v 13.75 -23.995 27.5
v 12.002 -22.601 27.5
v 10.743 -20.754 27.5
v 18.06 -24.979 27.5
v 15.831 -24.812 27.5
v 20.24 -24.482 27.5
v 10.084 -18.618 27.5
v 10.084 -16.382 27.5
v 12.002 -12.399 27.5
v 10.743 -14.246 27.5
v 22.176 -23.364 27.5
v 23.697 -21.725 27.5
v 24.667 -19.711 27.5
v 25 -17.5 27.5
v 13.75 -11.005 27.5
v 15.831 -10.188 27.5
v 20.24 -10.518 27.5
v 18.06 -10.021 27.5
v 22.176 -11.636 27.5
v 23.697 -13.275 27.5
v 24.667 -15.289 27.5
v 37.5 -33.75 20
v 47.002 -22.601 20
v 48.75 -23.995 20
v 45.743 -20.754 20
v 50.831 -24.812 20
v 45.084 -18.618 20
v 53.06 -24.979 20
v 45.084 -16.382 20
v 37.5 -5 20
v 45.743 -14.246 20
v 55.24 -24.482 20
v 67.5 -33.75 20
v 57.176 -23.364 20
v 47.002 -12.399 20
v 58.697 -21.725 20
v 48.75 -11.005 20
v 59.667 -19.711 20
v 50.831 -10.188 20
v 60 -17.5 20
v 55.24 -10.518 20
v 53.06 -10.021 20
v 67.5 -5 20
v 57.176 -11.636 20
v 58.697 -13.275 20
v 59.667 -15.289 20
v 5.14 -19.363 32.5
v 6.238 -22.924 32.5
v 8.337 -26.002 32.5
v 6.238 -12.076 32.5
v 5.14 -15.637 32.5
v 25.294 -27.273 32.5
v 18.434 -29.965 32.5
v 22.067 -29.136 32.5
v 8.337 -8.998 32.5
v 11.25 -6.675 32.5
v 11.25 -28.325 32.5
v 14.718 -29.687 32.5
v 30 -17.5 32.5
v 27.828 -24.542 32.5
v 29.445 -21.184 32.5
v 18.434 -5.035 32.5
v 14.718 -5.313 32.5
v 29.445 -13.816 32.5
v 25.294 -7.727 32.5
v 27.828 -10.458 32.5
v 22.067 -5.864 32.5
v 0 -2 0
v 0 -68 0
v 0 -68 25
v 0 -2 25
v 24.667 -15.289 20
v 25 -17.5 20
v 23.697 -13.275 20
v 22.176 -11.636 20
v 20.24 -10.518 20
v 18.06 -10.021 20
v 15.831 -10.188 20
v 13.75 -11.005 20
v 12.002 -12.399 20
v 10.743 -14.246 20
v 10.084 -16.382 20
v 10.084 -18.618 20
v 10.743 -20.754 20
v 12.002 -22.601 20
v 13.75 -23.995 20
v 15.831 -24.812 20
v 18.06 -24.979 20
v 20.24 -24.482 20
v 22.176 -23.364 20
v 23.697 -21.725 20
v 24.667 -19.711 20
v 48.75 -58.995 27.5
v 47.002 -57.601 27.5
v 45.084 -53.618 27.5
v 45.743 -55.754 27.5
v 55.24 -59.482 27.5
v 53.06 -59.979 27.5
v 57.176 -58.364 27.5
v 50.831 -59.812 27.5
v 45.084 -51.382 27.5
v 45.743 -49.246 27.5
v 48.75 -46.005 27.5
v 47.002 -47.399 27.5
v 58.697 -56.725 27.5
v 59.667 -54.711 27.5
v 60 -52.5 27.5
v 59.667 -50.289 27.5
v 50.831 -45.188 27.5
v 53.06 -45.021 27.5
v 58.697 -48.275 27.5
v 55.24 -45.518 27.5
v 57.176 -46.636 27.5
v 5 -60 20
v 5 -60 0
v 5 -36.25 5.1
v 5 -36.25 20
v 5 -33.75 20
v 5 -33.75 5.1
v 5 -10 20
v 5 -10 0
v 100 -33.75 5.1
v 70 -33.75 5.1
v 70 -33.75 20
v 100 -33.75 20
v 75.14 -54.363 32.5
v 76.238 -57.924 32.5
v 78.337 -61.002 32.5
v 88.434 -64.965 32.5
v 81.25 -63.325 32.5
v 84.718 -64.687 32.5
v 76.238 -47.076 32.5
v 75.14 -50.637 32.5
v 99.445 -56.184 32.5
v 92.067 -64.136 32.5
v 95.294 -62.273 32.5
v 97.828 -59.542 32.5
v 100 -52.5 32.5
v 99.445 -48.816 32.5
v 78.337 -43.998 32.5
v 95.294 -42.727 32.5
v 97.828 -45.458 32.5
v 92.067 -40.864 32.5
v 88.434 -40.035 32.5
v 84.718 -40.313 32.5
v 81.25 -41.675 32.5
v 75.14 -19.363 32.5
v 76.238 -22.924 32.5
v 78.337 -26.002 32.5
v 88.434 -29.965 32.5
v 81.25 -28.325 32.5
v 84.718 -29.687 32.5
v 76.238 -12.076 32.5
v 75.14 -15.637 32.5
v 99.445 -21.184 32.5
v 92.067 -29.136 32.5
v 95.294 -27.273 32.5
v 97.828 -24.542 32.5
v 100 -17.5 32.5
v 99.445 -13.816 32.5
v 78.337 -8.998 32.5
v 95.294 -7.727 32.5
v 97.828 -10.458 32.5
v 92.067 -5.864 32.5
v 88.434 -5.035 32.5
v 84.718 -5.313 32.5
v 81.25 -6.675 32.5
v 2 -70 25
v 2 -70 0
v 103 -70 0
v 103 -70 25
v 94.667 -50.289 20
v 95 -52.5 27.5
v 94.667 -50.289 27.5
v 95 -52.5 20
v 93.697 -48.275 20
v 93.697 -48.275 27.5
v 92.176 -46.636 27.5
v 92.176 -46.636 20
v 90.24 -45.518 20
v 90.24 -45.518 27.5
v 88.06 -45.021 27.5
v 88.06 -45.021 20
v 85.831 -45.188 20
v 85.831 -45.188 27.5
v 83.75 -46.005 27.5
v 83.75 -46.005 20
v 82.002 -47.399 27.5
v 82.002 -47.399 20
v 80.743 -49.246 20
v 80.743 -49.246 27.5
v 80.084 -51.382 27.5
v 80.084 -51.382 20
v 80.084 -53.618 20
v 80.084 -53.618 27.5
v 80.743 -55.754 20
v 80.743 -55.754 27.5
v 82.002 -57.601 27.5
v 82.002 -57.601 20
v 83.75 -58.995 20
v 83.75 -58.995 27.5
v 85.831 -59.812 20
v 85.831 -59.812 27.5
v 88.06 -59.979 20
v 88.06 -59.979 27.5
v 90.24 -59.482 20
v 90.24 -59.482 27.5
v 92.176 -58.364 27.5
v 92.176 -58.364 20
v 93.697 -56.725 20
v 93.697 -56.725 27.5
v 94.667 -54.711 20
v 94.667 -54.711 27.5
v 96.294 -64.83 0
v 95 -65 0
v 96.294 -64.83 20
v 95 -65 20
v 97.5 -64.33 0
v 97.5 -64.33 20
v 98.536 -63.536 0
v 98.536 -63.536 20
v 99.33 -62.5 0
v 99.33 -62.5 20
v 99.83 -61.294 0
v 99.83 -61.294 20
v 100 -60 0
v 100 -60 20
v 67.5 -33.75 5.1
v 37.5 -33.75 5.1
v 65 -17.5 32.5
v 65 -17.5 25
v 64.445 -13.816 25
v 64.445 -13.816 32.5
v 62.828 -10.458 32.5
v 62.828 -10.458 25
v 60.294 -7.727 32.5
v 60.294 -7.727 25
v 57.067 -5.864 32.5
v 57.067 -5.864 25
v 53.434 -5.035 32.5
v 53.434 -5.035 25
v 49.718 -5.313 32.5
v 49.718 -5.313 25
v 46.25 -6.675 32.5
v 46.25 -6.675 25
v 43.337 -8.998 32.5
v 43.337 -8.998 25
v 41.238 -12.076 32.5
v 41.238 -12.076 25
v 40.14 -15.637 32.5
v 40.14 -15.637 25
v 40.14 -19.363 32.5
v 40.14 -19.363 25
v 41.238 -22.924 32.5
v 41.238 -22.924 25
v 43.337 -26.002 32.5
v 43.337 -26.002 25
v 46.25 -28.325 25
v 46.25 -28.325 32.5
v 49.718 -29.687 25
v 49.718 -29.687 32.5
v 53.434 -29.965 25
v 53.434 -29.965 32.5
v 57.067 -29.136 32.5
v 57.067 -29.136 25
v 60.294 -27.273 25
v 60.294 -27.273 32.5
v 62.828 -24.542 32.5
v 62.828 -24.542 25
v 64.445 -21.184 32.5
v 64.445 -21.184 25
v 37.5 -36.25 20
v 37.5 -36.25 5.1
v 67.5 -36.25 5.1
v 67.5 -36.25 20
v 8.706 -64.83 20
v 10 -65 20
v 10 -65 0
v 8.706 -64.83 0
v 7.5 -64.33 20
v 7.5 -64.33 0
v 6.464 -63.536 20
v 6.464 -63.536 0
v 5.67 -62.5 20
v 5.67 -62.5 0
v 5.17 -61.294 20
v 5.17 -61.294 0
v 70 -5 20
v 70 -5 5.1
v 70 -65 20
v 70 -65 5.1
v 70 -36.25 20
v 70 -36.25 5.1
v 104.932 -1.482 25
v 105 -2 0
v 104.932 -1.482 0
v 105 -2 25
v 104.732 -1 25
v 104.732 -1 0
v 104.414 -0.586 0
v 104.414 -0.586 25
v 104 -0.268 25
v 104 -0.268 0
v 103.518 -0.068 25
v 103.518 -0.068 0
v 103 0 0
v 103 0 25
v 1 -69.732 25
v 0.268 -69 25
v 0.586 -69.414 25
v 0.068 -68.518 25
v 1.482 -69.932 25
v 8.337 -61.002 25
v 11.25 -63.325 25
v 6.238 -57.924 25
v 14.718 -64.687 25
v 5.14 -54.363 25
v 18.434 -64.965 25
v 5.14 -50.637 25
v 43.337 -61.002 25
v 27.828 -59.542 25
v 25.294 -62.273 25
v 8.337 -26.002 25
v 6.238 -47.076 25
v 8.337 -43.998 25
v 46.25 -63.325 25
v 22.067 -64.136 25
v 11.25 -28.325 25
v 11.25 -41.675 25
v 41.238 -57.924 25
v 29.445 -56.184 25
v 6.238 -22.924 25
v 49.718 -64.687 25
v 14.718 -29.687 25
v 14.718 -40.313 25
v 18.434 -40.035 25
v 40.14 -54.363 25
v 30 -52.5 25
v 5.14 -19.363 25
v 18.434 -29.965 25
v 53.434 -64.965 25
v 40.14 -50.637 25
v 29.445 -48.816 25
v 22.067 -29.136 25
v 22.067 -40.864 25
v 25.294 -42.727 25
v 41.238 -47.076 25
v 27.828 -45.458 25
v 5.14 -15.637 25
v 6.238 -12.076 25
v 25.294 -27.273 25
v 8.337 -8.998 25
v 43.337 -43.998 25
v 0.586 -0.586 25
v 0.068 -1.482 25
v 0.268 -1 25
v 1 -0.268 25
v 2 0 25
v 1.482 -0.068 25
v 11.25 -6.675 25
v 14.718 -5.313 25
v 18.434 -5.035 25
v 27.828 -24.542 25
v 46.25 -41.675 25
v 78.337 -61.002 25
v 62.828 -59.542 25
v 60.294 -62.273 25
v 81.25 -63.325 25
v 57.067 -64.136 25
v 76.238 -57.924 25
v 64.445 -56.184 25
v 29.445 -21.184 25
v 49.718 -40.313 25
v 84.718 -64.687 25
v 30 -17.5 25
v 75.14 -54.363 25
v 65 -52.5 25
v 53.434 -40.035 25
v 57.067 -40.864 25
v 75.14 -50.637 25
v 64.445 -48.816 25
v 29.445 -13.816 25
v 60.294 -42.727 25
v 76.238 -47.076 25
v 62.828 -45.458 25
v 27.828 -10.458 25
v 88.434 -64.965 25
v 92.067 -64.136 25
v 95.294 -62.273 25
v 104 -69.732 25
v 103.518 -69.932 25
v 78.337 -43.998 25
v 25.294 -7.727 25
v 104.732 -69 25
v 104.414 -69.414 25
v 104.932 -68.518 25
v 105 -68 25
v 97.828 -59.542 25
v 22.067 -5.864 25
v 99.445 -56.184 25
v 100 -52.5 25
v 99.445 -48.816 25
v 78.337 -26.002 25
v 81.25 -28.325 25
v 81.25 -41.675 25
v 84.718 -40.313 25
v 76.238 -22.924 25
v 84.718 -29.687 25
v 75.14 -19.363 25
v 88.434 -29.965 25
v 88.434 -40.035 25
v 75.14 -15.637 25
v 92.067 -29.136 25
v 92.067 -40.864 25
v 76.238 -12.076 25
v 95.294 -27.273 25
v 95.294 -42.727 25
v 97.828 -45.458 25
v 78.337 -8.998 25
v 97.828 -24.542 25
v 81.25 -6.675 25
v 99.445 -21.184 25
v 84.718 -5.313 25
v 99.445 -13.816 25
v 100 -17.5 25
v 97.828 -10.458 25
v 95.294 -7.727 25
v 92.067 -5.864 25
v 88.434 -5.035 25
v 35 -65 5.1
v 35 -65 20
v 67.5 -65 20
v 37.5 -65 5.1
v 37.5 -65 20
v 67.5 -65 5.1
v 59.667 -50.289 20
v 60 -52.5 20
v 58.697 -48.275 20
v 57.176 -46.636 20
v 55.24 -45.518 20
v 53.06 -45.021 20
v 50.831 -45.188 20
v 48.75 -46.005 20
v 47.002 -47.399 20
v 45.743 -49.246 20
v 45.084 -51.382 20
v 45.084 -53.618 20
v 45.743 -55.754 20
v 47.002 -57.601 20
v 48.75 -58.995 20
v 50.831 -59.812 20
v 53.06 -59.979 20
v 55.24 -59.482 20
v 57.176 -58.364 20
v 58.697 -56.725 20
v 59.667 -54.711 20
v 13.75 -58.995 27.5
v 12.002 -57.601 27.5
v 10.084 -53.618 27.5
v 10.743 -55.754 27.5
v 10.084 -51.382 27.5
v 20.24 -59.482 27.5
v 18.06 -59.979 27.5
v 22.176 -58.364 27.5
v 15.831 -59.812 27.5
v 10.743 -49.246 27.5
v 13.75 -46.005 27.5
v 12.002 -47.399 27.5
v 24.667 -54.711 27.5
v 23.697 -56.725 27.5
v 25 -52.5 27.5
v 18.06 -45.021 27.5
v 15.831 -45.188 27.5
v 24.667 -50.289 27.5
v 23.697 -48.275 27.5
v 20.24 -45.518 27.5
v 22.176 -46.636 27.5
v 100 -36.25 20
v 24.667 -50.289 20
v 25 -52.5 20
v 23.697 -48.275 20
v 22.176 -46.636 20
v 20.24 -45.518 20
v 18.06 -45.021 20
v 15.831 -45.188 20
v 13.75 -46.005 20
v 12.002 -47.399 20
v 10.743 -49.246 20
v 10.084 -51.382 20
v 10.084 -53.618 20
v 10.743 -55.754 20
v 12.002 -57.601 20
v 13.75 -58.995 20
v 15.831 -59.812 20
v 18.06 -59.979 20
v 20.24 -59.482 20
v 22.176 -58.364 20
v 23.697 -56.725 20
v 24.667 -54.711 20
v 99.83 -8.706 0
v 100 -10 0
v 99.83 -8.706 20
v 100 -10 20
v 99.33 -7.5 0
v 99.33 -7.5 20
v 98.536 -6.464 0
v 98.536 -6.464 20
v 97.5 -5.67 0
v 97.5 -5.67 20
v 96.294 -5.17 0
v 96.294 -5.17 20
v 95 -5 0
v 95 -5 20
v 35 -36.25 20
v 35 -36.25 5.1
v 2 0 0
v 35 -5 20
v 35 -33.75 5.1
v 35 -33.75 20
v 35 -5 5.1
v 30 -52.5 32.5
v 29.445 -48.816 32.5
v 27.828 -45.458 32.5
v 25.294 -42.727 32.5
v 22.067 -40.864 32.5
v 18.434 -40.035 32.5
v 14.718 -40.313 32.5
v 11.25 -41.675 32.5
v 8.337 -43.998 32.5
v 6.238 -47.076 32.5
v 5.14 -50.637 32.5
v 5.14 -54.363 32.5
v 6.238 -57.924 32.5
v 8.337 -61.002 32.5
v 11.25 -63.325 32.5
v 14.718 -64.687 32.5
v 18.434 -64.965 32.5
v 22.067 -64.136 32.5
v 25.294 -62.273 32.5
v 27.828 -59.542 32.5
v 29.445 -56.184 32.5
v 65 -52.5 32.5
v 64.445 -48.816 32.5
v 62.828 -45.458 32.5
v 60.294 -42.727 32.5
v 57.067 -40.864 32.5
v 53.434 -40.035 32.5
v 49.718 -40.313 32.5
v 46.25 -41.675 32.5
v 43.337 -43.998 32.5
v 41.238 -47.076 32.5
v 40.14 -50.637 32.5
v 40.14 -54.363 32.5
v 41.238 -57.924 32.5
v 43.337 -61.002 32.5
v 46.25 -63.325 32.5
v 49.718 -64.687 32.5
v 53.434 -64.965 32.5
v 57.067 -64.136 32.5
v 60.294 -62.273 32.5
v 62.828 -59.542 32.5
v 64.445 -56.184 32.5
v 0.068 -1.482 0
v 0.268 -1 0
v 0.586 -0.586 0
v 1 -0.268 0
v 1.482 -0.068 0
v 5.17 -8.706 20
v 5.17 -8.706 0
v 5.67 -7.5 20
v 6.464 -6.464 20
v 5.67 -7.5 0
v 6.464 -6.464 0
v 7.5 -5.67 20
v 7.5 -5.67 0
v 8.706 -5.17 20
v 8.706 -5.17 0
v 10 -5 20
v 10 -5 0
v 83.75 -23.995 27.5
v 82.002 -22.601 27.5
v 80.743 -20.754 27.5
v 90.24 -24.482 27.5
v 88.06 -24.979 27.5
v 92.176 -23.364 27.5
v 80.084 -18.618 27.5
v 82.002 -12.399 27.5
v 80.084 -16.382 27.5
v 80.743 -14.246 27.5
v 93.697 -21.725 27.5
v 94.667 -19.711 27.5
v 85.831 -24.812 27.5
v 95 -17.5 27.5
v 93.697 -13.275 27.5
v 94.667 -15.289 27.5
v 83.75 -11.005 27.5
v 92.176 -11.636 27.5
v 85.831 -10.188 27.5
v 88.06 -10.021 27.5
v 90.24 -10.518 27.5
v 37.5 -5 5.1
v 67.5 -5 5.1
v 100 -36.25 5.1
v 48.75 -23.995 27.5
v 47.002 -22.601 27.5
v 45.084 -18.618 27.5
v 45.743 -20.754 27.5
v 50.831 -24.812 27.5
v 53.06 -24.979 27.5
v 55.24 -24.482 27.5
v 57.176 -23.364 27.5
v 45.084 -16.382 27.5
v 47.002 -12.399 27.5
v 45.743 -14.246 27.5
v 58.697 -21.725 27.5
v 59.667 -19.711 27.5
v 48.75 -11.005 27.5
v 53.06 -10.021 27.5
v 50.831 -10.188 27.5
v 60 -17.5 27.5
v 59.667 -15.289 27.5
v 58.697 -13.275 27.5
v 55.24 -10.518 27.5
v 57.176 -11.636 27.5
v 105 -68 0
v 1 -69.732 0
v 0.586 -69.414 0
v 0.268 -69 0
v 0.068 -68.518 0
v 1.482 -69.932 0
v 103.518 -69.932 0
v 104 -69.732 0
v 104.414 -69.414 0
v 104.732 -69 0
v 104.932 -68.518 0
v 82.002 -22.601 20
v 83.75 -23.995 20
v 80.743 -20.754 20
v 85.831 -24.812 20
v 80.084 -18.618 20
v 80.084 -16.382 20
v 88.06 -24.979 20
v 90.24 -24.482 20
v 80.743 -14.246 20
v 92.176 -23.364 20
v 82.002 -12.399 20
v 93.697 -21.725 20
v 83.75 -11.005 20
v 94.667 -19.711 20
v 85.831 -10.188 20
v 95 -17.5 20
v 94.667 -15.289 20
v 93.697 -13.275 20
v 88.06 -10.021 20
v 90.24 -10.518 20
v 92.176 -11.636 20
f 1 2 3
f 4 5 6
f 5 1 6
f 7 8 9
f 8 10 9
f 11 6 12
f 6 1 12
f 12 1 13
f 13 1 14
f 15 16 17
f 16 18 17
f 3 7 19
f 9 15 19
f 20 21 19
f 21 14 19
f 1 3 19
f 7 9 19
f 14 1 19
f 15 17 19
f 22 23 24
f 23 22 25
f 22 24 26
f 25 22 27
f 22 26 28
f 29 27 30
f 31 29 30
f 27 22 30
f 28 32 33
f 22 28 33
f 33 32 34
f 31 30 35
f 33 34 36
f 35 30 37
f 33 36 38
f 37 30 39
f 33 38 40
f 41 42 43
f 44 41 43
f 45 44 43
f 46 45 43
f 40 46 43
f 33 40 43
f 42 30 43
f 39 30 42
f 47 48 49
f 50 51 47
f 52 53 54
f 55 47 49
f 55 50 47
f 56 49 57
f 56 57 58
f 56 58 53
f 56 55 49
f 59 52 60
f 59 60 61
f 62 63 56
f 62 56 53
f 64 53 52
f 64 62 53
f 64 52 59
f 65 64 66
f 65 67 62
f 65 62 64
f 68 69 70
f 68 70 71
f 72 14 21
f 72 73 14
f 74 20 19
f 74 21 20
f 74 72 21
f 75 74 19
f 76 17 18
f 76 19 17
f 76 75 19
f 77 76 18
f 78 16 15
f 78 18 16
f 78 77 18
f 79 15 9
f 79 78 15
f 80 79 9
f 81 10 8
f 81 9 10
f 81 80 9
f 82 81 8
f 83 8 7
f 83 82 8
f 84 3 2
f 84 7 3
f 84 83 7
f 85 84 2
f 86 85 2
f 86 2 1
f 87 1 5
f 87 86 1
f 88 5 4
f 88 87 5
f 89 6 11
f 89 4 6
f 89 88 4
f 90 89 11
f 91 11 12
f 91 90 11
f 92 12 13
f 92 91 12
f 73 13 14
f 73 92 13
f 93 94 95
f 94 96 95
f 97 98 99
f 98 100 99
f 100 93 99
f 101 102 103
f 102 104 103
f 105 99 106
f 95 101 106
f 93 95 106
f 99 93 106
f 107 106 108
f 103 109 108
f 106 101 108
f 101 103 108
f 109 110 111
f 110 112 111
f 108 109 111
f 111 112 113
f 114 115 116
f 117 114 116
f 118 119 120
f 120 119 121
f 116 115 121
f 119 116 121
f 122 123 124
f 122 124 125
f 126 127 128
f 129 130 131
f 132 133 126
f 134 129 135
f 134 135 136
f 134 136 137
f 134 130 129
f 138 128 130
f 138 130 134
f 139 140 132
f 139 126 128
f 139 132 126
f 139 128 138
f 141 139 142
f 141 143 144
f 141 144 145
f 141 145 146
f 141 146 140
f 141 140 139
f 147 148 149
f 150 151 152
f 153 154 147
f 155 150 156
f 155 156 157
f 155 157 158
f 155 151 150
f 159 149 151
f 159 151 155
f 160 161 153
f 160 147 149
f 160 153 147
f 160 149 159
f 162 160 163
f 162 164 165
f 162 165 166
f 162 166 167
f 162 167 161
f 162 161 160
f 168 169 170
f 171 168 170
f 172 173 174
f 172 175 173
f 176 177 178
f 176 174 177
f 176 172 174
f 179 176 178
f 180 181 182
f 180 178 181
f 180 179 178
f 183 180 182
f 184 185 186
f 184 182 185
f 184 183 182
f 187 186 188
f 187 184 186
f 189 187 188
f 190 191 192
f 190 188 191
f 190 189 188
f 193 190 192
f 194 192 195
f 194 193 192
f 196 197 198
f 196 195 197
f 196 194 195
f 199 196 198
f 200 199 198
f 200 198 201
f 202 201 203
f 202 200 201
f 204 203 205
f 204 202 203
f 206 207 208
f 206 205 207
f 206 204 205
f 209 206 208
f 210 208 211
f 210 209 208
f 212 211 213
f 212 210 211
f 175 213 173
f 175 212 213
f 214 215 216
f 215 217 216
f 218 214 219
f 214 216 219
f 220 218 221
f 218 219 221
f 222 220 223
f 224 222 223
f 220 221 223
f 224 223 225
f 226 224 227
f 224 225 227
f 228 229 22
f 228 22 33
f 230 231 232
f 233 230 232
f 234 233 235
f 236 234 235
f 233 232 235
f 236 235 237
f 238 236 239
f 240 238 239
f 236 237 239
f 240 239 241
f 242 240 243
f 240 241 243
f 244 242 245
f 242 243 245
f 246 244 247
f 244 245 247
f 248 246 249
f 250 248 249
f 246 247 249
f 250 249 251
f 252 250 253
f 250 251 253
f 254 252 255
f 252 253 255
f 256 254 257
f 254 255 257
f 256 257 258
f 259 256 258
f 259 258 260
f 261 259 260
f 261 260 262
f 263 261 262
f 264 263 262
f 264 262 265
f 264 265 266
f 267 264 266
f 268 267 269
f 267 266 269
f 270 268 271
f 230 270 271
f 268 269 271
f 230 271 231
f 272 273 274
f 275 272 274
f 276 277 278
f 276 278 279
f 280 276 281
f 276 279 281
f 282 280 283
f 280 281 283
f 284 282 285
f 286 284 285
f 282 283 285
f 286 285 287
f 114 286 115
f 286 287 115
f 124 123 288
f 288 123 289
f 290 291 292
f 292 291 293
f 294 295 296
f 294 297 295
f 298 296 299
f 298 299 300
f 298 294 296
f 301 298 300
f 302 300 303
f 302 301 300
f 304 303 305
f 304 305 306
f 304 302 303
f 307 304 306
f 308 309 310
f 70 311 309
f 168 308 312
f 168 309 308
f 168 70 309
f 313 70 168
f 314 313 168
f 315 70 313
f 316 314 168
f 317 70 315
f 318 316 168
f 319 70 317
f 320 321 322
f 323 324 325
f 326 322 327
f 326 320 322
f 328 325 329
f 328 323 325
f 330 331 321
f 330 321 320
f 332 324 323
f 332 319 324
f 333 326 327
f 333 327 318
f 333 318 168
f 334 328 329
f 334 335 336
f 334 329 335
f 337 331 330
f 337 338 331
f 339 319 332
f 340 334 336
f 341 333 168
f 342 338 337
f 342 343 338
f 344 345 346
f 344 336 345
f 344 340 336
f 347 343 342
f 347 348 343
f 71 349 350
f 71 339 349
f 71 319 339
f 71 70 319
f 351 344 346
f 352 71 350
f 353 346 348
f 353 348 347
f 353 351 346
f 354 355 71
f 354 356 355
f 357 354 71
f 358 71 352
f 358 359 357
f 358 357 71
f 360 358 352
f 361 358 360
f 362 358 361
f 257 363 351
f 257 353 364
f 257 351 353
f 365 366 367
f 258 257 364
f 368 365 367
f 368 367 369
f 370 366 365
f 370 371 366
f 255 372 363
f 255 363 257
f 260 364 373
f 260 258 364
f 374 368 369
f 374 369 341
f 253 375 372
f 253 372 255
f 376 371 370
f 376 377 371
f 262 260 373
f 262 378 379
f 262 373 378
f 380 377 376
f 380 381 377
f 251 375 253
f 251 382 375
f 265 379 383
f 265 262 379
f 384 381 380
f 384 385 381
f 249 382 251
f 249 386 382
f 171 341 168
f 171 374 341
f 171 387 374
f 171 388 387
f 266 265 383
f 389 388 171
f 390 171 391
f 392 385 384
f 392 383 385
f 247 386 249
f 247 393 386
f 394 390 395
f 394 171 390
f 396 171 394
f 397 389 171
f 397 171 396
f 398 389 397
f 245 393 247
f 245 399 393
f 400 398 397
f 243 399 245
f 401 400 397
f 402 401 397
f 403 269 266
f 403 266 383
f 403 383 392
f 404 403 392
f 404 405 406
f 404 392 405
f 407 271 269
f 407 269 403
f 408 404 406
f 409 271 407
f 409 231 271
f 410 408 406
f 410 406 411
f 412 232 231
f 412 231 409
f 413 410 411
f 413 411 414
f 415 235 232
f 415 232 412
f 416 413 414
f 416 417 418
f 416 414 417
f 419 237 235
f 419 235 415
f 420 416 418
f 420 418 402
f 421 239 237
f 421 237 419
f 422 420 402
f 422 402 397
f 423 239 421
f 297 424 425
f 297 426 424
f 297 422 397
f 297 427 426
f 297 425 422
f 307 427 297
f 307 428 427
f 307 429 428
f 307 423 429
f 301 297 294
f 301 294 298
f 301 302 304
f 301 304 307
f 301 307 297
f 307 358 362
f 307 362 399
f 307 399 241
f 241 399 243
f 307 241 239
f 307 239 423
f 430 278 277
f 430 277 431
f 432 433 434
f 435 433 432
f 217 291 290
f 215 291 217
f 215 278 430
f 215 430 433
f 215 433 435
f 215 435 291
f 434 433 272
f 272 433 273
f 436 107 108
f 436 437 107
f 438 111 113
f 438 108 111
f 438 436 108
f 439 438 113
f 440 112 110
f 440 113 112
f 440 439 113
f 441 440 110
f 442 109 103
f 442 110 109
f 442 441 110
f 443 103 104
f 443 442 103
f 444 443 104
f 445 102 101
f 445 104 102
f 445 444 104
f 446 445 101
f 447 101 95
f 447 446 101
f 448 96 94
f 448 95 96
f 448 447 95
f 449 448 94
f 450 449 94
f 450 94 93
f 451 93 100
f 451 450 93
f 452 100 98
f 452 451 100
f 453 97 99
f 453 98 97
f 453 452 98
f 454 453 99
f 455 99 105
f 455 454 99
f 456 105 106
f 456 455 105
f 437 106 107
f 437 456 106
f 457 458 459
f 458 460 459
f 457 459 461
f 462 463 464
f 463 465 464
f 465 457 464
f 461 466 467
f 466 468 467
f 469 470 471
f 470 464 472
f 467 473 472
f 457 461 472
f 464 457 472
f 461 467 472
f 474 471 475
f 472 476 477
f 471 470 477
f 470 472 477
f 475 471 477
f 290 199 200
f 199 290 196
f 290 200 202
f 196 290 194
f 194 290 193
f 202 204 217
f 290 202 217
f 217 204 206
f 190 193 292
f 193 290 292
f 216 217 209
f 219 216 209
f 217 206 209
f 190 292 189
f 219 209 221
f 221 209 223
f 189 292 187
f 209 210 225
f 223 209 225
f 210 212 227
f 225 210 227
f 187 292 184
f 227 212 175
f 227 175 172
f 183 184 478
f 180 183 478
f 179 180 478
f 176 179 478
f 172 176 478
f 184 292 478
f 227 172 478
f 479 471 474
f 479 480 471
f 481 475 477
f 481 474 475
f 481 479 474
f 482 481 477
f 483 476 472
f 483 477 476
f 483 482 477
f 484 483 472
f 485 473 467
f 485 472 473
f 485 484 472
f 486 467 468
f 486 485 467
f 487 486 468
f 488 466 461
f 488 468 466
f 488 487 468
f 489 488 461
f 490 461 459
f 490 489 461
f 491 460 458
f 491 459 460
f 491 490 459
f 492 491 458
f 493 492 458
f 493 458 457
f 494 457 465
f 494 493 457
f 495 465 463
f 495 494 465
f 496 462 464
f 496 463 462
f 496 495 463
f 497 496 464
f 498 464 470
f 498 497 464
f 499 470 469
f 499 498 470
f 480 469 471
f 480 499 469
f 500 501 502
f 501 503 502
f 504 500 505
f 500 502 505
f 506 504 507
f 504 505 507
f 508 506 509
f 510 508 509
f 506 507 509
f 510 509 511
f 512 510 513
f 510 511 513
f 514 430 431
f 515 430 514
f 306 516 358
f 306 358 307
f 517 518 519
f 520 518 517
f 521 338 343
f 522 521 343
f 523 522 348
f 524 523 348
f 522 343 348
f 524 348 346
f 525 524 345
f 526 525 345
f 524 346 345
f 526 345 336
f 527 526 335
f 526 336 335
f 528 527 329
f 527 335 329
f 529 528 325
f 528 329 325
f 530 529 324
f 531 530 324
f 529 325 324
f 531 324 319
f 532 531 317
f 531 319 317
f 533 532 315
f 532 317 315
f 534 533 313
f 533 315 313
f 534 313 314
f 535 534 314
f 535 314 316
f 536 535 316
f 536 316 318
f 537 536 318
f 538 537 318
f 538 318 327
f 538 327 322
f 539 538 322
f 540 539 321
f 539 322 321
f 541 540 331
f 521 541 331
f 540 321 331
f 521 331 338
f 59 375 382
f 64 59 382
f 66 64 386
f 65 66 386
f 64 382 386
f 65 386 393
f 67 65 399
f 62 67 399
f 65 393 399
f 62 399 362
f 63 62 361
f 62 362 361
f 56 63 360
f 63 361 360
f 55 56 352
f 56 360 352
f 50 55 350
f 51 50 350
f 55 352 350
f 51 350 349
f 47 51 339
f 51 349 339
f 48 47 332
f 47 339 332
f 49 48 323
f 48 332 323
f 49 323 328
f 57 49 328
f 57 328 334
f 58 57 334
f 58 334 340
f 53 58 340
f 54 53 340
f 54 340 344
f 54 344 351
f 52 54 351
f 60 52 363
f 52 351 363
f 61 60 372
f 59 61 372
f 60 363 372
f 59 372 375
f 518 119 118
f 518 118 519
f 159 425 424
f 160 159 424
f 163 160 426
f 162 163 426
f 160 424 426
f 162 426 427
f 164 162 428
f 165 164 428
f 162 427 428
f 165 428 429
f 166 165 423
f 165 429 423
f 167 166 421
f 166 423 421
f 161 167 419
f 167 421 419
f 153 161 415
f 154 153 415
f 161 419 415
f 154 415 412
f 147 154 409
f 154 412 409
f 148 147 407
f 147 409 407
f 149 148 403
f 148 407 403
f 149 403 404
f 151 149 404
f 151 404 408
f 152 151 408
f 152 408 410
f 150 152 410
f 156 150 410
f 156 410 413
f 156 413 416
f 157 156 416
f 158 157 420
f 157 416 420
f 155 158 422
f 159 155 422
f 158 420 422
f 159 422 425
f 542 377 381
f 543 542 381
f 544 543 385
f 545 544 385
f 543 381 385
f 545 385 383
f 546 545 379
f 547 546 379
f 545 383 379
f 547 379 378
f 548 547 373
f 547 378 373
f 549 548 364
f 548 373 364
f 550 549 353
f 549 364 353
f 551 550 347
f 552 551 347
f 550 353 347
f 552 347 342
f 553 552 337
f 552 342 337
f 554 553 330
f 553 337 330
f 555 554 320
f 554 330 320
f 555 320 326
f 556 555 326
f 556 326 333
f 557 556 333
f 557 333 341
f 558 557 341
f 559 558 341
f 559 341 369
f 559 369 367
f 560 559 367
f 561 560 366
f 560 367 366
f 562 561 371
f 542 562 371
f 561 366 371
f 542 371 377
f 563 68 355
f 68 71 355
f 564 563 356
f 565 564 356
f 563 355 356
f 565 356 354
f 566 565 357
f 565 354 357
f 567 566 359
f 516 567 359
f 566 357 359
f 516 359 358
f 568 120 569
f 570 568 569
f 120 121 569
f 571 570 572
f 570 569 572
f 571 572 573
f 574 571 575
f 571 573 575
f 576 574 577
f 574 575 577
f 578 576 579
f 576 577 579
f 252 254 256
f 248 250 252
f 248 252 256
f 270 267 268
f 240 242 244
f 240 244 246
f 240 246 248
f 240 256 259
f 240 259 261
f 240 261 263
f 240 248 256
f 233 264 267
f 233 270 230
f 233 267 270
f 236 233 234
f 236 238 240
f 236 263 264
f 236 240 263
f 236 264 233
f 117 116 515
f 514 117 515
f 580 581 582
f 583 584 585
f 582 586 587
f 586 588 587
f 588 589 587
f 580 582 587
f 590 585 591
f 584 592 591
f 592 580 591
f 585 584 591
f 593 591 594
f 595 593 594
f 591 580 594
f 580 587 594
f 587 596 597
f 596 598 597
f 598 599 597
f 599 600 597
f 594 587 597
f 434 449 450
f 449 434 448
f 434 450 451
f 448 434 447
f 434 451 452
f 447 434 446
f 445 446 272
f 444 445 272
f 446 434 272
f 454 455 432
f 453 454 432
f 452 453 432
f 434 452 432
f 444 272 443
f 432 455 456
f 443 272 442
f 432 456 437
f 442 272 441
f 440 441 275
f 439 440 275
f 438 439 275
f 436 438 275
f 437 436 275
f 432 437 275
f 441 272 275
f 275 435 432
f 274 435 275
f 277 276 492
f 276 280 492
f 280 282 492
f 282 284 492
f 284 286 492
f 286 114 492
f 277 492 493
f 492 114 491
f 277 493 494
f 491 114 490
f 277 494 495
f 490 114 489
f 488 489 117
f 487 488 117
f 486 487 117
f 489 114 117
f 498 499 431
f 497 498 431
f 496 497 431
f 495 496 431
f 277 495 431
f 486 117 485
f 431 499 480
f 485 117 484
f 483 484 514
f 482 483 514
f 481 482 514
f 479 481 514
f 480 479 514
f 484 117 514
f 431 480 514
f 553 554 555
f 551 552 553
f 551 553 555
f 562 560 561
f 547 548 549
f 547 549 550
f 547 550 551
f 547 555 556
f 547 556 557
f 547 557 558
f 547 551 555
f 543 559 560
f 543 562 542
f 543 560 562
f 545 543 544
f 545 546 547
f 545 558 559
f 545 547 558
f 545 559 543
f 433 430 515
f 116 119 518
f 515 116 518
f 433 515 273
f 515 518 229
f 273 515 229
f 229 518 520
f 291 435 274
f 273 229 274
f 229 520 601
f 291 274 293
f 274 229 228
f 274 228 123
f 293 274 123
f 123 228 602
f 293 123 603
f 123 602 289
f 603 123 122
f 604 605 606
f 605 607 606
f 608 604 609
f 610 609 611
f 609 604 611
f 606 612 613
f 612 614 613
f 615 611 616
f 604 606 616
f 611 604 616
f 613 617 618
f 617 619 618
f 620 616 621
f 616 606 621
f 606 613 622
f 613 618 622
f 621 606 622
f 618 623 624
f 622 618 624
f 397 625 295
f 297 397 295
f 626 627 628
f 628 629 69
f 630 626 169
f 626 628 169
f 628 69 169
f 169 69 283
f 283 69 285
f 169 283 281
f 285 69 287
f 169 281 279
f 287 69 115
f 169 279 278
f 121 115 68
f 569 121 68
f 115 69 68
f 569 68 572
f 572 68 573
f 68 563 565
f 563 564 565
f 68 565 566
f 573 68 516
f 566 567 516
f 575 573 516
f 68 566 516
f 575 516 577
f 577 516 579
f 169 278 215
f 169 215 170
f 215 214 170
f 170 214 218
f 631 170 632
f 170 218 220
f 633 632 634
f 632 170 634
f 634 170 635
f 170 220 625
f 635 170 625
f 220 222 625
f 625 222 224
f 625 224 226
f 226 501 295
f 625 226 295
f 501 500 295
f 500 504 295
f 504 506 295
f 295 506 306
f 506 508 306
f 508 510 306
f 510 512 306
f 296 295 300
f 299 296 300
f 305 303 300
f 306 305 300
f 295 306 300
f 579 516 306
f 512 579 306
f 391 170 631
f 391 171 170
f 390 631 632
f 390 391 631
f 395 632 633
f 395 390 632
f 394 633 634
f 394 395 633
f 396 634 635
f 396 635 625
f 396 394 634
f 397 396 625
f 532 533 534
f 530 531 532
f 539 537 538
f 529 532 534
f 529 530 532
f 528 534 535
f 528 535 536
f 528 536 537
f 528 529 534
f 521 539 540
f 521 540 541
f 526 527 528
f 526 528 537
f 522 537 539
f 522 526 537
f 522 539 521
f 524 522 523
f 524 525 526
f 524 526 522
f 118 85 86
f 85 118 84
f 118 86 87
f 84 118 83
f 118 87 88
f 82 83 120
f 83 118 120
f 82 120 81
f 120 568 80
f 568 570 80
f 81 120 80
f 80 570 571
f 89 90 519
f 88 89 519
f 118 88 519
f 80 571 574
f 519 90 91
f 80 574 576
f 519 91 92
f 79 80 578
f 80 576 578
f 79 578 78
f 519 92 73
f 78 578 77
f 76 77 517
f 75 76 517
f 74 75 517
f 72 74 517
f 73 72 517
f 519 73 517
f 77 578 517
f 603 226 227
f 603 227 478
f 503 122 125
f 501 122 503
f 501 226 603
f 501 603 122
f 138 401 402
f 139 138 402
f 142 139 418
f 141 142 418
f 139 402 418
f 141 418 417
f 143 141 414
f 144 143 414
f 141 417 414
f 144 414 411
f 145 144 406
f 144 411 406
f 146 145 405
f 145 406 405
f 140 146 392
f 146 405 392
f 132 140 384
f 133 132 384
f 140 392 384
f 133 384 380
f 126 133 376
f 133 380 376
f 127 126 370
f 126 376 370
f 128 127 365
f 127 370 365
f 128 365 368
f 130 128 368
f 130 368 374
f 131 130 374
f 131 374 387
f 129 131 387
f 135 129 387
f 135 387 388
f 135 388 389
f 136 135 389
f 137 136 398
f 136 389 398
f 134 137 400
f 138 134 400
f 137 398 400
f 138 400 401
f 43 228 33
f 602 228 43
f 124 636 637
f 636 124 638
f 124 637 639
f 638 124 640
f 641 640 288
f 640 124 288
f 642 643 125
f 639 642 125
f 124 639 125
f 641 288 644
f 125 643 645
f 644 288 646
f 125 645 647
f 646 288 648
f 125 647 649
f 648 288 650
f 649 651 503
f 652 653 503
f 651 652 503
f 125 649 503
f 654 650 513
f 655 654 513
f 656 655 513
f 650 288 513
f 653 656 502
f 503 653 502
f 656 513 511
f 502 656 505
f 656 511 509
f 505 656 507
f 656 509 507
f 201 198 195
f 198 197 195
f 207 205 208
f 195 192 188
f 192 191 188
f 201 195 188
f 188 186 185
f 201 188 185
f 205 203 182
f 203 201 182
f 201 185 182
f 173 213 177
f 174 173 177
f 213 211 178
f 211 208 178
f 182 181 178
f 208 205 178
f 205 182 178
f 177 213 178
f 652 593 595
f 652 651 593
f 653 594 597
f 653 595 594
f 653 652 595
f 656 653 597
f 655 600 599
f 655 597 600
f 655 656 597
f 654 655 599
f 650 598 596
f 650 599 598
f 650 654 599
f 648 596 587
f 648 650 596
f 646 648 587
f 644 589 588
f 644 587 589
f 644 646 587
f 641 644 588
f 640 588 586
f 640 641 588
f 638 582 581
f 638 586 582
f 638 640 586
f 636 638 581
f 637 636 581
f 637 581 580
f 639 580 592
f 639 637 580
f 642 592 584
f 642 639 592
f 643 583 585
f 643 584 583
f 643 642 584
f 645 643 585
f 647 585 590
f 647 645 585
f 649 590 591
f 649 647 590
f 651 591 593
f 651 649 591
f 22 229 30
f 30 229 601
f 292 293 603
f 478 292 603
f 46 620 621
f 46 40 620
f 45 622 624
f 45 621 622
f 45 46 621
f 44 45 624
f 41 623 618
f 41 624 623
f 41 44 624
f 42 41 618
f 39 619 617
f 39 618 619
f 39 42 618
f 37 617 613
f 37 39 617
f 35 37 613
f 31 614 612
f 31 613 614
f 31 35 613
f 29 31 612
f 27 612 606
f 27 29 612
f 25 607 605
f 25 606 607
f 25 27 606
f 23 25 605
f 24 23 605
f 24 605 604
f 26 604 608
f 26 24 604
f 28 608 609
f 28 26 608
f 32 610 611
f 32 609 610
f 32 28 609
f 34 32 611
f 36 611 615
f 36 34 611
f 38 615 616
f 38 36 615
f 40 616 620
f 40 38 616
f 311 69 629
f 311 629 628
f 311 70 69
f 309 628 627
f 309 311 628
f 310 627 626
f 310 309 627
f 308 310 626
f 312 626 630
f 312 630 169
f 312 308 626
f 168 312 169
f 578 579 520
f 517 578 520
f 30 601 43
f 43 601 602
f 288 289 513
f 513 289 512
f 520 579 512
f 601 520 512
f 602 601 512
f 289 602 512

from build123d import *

# Parameters (mm, degrees)
F0_W     = 105
F0_H     = 70
F1_DEPTH = 25
F2_R     = 12.5
F3_DEPTH = 7.5
F4_T     = -5
F6_W     = 95
F6_H     = 2.5
F7_DEPTH = 14.9
F8_W     = 2.5
F8_H     = 60
F9_DEPTH = 19.9
F10_R    = 5
F11_R    = 2


# Not quite as in the source:
# - an extrude ends at something that could not be found from the text; its depth is read off the source's solid


with BuildPart() as f1:
    # F0 (on Top) → F1 (new body)
    with BuildSketch(Plane.XY):
        with Locations((52.5, -35)):
            Rectangle(F0_W, F0_H)
    extrude(amount=F1_DEPTH)

    # F2 (on face) → F3 (join)
    with BuildSketch(Plane.XY.offset(25)):
        with Locations((17.5, -17.5)):
            Circle(F2_R)
        with Locations((52.5, -17.5)):
            Circle(F2_R)
        with Locations((87.5, -17.5)):
            Circle(F2_R)
        with Locations((17.5, -52.5)):
            Circle(F2_R)
        with Locations((52.5, -52.5)):
            Circle(F2_R)
        with Locations((87.5, -52.5)):
            Circle(F2_R)
    extrude(amount=F3_DEPTH)

    # F4
    f4_openings = [f1.faces().sort_by_distance(p)[0] for p in [
        (52.5, -35, 0),
    ]]
    offset(amount=F4_T, openings=f4_openings, kind=Kind.INTERSECTION)

    # F6 (on offset) → F7 (join, through all)
    with BuildSketch(Plane.XY.offset(5.1)):
        with Locations((52.5, -35)):
            Rectangle(F6_W, F6_H)
    extrude(amount=F7_DEPTH)

    # F8 (on offset) → F9 (join, through all)
    with BuildSketch(Plane.XY.offset(5.1)):
        with Locations((36.25, -35)):
            Rectangle(F8_W, F8_H)
        with Locations((68.75, -35)):
            Rectangle(F8_W, F8_H)
    extrude(amount=F9_DEPTH)

    # F10
    f10_edges = [f1.edges().sort_by_distance(p)[0] for p in [
        (5, -65, 10),
        (5, -5, 10),
        (100, -65, 10),
        (100, -5, 10),
    ]]
    fillet(f10_edges, radius=F10_R)

    # F11
    f11_edges = [f1.edges().sort_by_distance(p)[0] for p in [
        (105, -70, 12.5),
        (0, -70, 12.5),
        (0, 0, 12.5),
        (105, 0, 12.5),
    ]]
    fillet(f11_edges, radius=F11_R)


solid = f1.part
